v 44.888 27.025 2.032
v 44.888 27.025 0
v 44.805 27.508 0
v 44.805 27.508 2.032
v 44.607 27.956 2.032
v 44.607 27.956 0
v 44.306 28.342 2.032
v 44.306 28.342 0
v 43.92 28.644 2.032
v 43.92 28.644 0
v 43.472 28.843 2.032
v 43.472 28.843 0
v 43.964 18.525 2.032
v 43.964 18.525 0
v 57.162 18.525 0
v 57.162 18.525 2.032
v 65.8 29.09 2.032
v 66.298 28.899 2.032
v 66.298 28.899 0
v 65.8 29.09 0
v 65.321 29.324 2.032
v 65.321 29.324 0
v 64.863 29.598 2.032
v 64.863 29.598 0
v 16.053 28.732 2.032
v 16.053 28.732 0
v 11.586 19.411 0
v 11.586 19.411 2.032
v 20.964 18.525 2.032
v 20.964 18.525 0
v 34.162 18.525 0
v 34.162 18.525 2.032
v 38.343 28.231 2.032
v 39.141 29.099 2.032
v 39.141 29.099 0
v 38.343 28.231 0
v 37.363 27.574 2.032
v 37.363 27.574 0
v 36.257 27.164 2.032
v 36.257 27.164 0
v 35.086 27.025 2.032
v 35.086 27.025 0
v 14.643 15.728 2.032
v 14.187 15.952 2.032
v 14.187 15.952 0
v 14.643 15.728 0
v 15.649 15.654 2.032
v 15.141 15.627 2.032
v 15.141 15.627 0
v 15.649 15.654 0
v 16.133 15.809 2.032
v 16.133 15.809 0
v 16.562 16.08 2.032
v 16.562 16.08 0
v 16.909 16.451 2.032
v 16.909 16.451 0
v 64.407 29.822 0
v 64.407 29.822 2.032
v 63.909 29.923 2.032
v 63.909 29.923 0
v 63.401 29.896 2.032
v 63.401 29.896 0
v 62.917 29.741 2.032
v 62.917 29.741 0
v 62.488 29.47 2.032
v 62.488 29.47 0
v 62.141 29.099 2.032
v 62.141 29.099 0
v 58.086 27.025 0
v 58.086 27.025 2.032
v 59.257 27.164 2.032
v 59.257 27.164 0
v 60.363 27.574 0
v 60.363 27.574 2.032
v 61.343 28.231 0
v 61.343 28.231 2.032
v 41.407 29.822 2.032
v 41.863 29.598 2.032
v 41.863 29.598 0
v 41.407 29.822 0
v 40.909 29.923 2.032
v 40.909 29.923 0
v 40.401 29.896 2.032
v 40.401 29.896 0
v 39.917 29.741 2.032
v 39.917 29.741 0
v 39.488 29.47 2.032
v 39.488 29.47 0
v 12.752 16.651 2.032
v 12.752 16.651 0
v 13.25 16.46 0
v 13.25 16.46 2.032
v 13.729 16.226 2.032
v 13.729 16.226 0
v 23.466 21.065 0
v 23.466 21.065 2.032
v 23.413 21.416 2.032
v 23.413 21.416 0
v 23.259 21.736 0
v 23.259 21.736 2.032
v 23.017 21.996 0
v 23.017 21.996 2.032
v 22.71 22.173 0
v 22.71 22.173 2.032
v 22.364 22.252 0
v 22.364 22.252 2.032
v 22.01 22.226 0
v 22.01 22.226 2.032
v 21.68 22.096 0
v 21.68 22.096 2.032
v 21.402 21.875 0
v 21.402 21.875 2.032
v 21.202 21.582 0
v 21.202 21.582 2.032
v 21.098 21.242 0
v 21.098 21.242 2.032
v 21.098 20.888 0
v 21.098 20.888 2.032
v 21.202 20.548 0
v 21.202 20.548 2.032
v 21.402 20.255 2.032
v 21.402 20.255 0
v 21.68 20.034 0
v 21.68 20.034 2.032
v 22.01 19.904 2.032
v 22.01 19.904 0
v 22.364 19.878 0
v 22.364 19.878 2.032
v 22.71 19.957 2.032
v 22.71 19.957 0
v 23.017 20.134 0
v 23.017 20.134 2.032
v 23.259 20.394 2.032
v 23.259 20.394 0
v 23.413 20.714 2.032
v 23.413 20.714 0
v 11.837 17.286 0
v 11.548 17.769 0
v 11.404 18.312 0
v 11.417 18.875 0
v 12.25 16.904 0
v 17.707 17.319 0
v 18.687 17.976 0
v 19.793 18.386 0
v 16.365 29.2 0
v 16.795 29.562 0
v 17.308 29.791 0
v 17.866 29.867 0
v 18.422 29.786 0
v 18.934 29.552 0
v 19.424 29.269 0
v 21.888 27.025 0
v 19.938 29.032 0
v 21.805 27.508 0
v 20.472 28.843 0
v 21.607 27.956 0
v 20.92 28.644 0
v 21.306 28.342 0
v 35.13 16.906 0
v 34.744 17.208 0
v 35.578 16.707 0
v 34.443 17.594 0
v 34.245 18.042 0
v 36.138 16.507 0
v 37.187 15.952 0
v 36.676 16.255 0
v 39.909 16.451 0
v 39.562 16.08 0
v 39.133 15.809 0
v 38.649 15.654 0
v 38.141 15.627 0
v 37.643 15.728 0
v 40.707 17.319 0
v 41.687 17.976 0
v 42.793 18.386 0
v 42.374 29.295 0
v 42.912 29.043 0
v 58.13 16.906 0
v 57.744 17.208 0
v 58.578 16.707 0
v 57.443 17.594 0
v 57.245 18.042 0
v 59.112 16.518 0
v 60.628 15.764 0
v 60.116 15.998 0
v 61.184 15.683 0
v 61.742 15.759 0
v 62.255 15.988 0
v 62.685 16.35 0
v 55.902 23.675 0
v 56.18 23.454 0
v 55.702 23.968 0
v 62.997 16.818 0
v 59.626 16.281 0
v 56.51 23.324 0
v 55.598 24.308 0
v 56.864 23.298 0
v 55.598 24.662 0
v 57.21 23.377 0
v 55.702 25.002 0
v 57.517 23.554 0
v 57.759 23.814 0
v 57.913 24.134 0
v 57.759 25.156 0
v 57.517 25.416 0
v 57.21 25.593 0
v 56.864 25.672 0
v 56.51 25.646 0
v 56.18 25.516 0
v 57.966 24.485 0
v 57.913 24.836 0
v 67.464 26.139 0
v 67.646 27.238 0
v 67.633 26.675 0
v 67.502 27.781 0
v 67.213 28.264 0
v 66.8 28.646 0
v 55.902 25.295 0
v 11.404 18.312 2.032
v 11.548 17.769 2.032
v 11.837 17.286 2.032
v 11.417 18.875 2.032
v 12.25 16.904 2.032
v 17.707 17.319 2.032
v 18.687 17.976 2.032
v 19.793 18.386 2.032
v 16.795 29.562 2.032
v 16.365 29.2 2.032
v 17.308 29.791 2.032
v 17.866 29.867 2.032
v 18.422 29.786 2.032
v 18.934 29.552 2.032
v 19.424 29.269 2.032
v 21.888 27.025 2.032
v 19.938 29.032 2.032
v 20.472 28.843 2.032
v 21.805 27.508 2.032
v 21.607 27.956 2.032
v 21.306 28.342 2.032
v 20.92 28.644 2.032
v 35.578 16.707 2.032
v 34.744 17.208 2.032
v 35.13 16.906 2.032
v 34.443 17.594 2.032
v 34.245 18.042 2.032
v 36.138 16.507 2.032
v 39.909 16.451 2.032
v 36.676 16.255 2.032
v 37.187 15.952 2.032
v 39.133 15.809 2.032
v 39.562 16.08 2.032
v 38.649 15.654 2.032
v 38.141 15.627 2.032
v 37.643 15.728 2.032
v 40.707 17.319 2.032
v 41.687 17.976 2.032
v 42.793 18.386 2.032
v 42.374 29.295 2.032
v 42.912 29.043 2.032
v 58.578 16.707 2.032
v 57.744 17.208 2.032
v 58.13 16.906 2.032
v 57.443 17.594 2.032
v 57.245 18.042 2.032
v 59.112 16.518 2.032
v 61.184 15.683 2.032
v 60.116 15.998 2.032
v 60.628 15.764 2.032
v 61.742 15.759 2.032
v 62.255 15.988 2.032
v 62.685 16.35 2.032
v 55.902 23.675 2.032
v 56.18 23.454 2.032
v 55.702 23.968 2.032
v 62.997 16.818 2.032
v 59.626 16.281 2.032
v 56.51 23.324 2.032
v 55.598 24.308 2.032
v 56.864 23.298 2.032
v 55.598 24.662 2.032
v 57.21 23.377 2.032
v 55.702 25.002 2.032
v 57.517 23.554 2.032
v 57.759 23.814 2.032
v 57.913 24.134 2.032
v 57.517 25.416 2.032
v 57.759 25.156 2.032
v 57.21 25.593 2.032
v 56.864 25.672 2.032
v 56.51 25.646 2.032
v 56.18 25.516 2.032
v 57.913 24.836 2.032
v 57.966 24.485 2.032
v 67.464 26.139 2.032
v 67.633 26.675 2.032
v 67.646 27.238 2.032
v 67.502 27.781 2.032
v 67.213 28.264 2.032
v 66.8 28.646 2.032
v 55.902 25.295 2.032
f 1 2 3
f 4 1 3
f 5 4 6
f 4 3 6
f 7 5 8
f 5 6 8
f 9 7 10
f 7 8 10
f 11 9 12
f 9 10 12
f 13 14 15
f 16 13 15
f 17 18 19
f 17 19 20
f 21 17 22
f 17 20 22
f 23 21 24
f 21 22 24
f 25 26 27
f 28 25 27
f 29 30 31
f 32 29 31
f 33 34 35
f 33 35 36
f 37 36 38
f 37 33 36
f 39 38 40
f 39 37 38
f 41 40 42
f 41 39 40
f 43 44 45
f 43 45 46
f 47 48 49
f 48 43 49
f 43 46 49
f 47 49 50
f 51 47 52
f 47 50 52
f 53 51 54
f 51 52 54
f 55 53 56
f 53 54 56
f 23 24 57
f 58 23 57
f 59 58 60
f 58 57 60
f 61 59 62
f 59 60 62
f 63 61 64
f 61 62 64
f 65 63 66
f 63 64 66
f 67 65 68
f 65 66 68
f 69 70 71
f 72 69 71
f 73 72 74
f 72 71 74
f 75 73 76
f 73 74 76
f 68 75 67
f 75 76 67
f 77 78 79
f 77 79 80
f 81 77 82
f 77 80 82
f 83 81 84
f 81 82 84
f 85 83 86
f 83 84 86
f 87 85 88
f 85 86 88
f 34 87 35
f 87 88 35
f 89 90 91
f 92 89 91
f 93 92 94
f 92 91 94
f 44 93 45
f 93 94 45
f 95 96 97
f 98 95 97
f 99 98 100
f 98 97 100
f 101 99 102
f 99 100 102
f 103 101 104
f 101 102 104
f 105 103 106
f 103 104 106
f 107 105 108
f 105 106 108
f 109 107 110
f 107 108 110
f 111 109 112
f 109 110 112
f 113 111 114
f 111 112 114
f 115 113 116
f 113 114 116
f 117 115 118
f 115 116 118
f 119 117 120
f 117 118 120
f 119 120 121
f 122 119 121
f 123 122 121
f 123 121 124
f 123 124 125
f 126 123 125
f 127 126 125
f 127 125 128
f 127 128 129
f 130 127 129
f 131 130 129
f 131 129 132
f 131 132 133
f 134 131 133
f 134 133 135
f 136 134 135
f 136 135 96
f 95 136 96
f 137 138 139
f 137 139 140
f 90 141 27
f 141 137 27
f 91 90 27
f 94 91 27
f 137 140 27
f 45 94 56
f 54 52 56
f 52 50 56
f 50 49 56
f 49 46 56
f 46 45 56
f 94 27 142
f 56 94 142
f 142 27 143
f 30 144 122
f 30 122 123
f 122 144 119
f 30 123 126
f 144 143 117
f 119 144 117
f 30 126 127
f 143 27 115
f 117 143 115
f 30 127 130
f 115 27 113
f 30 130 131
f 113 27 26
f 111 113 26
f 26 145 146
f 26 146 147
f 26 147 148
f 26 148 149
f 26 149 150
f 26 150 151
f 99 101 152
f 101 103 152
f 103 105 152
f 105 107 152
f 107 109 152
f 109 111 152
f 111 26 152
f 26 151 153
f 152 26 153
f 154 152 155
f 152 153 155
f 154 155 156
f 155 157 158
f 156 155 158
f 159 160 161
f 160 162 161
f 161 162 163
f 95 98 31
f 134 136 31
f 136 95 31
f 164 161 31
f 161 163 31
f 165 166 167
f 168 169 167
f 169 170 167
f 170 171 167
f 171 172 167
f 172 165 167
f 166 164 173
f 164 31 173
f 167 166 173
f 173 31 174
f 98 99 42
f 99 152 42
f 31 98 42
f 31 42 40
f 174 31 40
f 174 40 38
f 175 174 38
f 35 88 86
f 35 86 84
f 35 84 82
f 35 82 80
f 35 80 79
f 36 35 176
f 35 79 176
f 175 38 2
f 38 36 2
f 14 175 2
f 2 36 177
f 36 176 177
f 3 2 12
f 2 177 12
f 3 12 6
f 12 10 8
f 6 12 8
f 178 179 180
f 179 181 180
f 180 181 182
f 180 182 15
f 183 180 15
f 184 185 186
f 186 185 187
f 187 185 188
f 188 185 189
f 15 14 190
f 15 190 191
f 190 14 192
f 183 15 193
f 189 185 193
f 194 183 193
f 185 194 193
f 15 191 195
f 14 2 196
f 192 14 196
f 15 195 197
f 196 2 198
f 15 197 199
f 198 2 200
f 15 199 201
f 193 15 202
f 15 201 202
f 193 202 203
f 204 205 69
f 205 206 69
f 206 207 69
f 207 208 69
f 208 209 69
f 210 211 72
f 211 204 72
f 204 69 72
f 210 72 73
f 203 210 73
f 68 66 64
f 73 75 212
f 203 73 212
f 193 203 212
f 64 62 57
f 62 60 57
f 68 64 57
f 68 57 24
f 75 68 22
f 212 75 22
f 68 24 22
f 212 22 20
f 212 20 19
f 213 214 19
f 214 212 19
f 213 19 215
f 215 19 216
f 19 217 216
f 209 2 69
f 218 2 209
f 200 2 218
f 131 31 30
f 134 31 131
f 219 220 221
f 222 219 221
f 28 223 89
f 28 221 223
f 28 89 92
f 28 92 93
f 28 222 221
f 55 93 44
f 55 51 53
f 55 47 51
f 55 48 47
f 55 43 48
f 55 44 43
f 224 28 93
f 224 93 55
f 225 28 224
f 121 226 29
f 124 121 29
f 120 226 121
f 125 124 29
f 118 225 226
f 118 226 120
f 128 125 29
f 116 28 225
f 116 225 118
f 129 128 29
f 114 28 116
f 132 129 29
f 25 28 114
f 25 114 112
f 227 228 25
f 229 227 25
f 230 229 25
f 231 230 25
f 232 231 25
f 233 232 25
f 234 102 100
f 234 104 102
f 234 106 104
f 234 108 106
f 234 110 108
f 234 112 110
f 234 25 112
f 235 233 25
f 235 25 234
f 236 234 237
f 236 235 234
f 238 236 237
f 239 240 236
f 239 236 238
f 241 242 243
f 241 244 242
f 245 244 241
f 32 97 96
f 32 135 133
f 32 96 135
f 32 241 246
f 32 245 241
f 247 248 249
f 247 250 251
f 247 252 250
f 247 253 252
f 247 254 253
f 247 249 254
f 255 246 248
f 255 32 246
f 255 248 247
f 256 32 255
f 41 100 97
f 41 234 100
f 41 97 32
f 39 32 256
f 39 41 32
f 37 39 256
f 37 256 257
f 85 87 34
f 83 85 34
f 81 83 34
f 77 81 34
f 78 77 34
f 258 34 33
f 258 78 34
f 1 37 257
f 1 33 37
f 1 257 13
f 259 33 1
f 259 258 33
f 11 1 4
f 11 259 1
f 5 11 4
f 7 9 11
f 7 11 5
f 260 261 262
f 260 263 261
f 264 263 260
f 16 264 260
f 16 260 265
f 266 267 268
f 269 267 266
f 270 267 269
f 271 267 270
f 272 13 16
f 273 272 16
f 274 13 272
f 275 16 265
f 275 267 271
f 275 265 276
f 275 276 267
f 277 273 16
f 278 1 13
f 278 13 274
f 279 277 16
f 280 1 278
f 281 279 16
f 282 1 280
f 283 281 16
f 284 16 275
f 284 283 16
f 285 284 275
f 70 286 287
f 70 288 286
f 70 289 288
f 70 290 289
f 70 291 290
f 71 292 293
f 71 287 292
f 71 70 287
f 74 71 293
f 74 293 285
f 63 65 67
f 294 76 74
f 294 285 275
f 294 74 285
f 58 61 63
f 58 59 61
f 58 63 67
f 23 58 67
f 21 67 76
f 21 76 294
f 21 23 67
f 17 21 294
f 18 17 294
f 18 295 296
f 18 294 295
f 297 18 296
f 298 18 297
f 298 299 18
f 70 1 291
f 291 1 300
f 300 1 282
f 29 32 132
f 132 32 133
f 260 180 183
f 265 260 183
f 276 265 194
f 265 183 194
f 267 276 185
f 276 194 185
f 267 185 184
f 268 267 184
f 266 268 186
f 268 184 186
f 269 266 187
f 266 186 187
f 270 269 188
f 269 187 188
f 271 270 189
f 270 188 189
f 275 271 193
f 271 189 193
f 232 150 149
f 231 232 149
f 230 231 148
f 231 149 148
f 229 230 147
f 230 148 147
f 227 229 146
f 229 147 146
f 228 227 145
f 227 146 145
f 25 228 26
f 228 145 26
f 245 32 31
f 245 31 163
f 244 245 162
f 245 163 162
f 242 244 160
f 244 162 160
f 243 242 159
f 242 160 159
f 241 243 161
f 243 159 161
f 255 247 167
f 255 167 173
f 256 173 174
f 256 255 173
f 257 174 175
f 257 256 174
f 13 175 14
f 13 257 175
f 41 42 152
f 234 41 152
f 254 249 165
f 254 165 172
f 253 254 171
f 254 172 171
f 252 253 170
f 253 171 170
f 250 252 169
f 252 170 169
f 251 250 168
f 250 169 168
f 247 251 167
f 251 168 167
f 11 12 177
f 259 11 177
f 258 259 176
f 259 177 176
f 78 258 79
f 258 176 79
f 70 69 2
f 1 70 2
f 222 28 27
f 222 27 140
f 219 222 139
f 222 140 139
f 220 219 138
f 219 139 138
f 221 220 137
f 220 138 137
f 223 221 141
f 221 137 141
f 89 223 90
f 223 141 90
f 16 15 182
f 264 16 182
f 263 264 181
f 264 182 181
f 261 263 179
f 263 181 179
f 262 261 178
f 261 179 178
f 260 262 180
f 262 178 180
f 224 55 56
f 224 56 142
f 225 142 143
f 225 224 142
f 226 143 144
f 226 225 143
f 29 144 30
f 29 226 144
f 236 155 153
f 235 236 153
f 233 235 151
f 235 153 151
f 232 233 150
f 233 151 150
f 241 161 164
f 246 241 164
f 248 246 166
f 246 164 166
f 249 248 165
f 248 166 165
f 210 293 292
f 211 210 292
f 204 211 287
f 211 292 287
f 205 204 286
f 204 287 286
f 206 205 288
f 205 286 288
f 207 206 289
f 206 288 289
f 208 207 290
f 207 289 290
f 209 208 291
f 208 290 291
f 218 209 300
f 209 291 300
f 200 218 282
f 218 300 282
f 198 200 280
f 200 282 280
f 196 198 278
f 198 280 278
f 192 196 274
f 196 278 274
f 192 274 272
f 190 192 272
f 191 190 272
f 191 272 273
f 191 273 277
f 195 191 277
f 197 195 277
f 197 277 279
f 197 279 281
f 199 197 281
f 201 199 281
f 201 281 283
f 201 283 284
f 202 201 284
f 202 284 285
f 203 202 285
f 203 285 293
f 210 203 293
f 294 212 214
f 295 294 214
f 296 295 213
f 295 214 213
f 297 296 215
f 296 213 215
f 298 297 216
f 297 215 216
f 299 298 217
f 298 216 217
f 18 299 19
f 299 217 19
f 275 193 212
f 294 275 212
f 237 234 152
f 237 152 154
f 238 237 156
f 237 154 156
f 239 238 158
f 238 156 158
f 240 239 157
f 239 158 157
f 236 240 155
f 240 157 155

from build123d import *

# Parameters (mm, degrees)
BOSS_EXTRUDE1_DEPTH = 2.032
FILLET1_R           = 5
FILLET4_R           = 2
SKETCH5_R           = 1.190625
CUT_EXTRUDE1_DEPTH  = 75.011460165


with BuildPart() as part:
    # Sketch3 → Boss-Extrude1 (new body)
    with BuildSketch(Plane.XY):
        with BuildLine():
            Line((61.234837488, 27.025), (44.888079179, 27.025))
            Line((44.888079179, 27.025), (45.635822761, 28.585508346))
            ThreePointArc((45.635822761, 28.585508346), (42.595854881, 29.183740622), (40.224926589, 31.178229429))
            Line((40.224926589, 31.178229429), (38.234837488, 27.025))
            Line((38.234837488, 27.025), (21.888079179, 27.025))
            Line((21.888079179, 27.025), (22.635822761, 28.585508346))
            ThreePointArc((22.635822761, 28.585508346), (19.595854881, 29.183740622), (17.224926589, 31.178229429))
            Line((17.224926589, 31.178229429), (10.414177239, 16.964491654))
            ThreePointArc((10.414177239, 16.964491654), (13.454145119, 16.366259378), (15.825073411, 14.371770571))
            Line((15.825073411, 14.371770571), (17.815162512, 18.525))
            Line((17.815162512, 18.525), (34.161920821, 18.525))
            Line((34.161920821, 18.525), (33.414177239, 16.964491654))
            ThreePointArc((33.414177239, 16.964491654), (36.454145119, 16.366259378), (38.825073411, 14.371770571))
            Line((38.825073411, 14.371770571), (40.815162512, 18.525))
            Line((40.815162512, 18.525), (57.161920821, 18.525))
            Line((57.161920821, 18.525), (56.414177239, 16.964491654))
            ThreePointArc((56.414177239, 16.964491654), (59.454145119, 16.366259378), (61.825073411, 14.371770571))
            Line((61.825073411, 14.371770571), (68.635822761, 28.585508346))
            ThreePointArc((68.635822761, 28.585508346), (65.595854881, 29.183740622), (63.224926589, 31.178229429))
            Line((63.224926589, 31.178229429), (61.234837488, 27.025))
        make_face()
    extrude(amount=BOSS_EXTRUDE1_DEPTH)

    # Fillet1
    fillet1_edges = [part.edges().sort_by_distance(p)[0] for p in [
        (38.234837488, 27.025, 1.016),
        (61.234837488, 27.025, 1.016),
        (40.815162512, 18.525, 1.016),
        (17.815162512, 18.525, 1.016),
    ]]
    fillet(fillet1_edges, radius=FILLET1_R)

    # Fillet4
    # the kernel refuses this fillet: 2 mm, written as the material it takes off along each edge
    with BuildSketch(Plane(origin=(61.825073411, 14.371770571, -6.782329983), x_dir=(-0.7244869564055234, 0.6892885099856672, 0), z_dir=(0, 0, 1))) as fillet4_piece_1:
        with BuildLine():
            CenterArc((2.739483145, -1.963474497), FILLET4_R, 100.966900666, 97.004726409)
            Line((0.837064294, -2.580566482), (0.799015917, -2.592908322))
            Line((0.799015917, -2.592908322), (-0.038048377, -0.01234184))
            Line((-0.038048377, -0.01234184), (0.007609675, 0.03926949))
            ThreePointArc((0.007609675, 0.03926949), (1.179499687, -0.073229059), (2.351389699, 0.03926949))
            Line((2.351389699, 0.03926949), (2.358999374, 0))
        make_face()
    extrude(amount=15.596659966, mode=Mode.SUBTRACT)
    with BuildSketch(Plane(origin=(56.414177239, 16.964491654, -5.447751417), x_dir=(0.4321201804305817, 0.9018160287246183, 0), z_dir=(0, 0, 1)), Plane(origin=(33.414177239, 16.964491654, -5.447751417), x_dir=(0.4321201804305726, 0.9018160287246226, 0), z_dir=(0, 0, 1))) as fillet4_piece_2:
        with BuildLine():
            CenterArc((2.679877065, -1.760257284), FILLET4_R, 118.342114692, 70.353672363)
            Line((0.702867053, -2.062633556), (0.663326852, -2.068681081))
            ThreePointArc((0.663326852, -2.068681081), (0.404900733, -1.013097188), (-0.035005574, -0.019354839))
            Line((-0.035005574, -0.019354839), (0, 0.04))
            ThreePointArc((0, 0.04), (0.865203266, 0.04), (1.71141712, 0.035205146))
            Line((1.71141712, 0.035205146), (1.730406531, 0))
        make_face()
    extrude(amount=12.927502834, mode=Mode.SUBTRACT)
    with BuildSketch(Plane(origin=(68.635822761, 28.585508346, -6.782329983), x_dir=(-0.43212018043056016, -0.9018160287246285, 0), z_dir=(0, 0, 1))) as fillet4_piece_3:
        with BuildLine():
            CenterArc((2.712931993, -2), FILLET4_R, 90, 97.004726409)
            Line((0.727859803, -2.243902439), (0.688158359, -2.248780488))
            ThreePointArc((0.688158359, -2.248780488), (0.433586073, -1.099356687), (-0.035005574, -0.019354839))
            Line((-0.035005574, -0.019354839), (0, 0.04))
            Line((0, 0.04), (2.712931993, 0.04))
            Line((2.712931993, 0.04), (2.712931993, 0))
        make_face()
    extrude(amount=15.596659966, mode=Mode.SUBTRACT)
    with BuildSketch(Plane(origin=(63.224926589, 31.178229429, -5.862766834), x_dir=(0.7197655743666583, -0.6942171979695075, 0), z_dir=(0, 0, 1)), Plane(origin=(38.825073411, 14.371770571, -5.862766834), x_dir=(-0.7197655743666577, 0.6942171979695083, 0), z_dir=(0, 0, 1))) as fillet4_piece_4:
        with BuildLine():
            CenterArc((2.642931874, -1.966025629), FILLET4_R, 100.575844506, 87.569716535)
            Line((0.663109271, -2.249402518), (0.465127011, -2.277740206))
            ThreePointArc((0.465127011, -2.277740206), (0.269143449, -1.445696099), (-0.189816279, -0.063006193))
            Line((-0.189816279, -0.063006193), (0.036707387, 0.196602563))
            ThreePointArc((0.036707387, 0.196602563), (1.137929001, 0.094679449), (2.239150616, 0.196602563))
            Line((2.239150616, 0.196602563), (2.275858003, 0))
        make_face()
    extrude(amount=13.757533668, mode=Mode.SUBTRACT)
    with BuildSketch(Plane(origin=(45.635822761, 28.585508346, -5.447751417), x_dir=(-0.992996409987433, 0.11814452908226362, 0), z_dir=(0, 0, 1)), Plane(origin=(22.635822761, 28.585508346, -5.447751417), x_dir=(-0.9929964099874332, 0.11814452908226183, 0), z_dir=(0, 0, 1))) as fillet4_piece_5:
        with BuildLine():
            CenterArc((2.5305684, 1.968875405), FILLET4_R, 189.524957294, 70.353672363)
            Line((0.558141169, 1.637920999), (0.518692625, 1.631301911))
            ThreePointArc((0.518692625, 1.631301911), (0.241208476, 0.831862466), (-0.037862109, 0.012901966))
            Line((-0.037862109, 0.012901966), (0.007029357, -0.039377508))
            ThreePointArc((0.007029357, -0.039377508), (1.089550283, 0.056486243), (2.17207121, -0.039377508))
            Line((2.17207121, -0.039377508), (2.179100567, 0))
        make_face()
    extrude(amount=12.927502834, mode=Mode.SUBTRACT)
    with BuildSketch(Plane(origin=(40.224926589, 31.178229429, -5.862766834), x_dir=(-0.4623630437345738, -0.8866907103316808, 0), z_dir=(0, 0, 1)), Plane(origin=(15.825073411, 14.371770571, -5.862766834), x_dir=(0.46236304373457116, 0.886690710331682, 0), z_dir=(0, 0, 1))) as fillet4_piece_6:
        with BuildLine():
            CenterArc((2.633114962, 1.979154178), FILLET4_R, 174.150669546, 87.569716535)
            Line((0.643528297, 2.18297984), (0.44456963, 2.203362406))
            ThreePointArc((0.44456963, 2.203362406), (0.230948584, 1.118261759), (-0.178199689, 0.090801271))
            Line((-0.178199689, 0.090801271), (0.006761891, -0.199885659))
            ThreePointArc((0.006761891, -0.199885659), (1.462800781, -0.150629619), (2.316305911, -0.197915418))
            Line((2.316305911, -0.197915418), (2.345106734, 0))
        make_face()
    extrude(amount=13.757533668, mode=Mode.SUBTRACT)
    with BuildSketch(Plane(origin=(10.414177239, 16.964491654, -6.782329983), x_dir=(0.9911448562189062, -0.13278506689685937, 0), z_dir=(0, 0, 1))) as fillet4_piece_7:
        with BuildLine():
            CenterArc((2.739483145, 1.963474497), FILLET4_R, 162.028372925, 97.004726409)
            Line((0.837064294, 2.580566482), (0.799015917, 2.592908322))
            Line((0.799015917, 2.592908322), (-0.038048377, 0.01234184))
            Line((-0.038048377, 0.01234184), (0.007609675, -0.03926949))
            ThreePointArc((0.007609675, -0.03926949), (1.179499687, 0.073229059), (2.351389699, -0.03926949))
            Line((2.351389699, -0.03926949), (2.358999374, 0))
        make_face()
    extrude(amount=15.596659966, mode=Mode.SUBTRACT)
    with BuildSketch(Plane(origin=(17.224926589, 31.178229429, -6.782329983), x_dir=(-0.4321201804305535, -0.9018160287246317, 0), z_dir=(0, 0, 1))) as fillet4_piece_8:
        with BuildLine():
            CenterArc((2.712931993, 2), FILLET4_R, 172.995273591, 97.004726409)
            Line((0.727859803, 2.243902439), (0.688158359, 2.248780488))
            ThreePointArc((0.688158359, 2.248780488), (0.433586073, 1.099356687), (-0.035005574, 0.019354839))
            Line((-0.035005574, 0.019354839), (0, -0.04))
            Line((0, -0.04), (2.712931993, -0.04))
            Line((2.712931993, -0.04), (2.712931993, 0))
        make_face()
    extrude(amount=15.596659966, mode=Mode.SUBTRACT)

    # Sketch5 → Cut-Extrude1 (cut, through all)
    with BuildSketch(Plane.XY.offset(2.032)):
        with Locations((22.275, 21.065)):
            Circle(SKETCH5_R)
        with Locations((56.775, 24.485)):
            Circle(SKETCH5_R)
    extrude(amount=-CUT_EXTRUDE1_DEPTH, mode=Mode.SUBTRACT)


solid = part.part
